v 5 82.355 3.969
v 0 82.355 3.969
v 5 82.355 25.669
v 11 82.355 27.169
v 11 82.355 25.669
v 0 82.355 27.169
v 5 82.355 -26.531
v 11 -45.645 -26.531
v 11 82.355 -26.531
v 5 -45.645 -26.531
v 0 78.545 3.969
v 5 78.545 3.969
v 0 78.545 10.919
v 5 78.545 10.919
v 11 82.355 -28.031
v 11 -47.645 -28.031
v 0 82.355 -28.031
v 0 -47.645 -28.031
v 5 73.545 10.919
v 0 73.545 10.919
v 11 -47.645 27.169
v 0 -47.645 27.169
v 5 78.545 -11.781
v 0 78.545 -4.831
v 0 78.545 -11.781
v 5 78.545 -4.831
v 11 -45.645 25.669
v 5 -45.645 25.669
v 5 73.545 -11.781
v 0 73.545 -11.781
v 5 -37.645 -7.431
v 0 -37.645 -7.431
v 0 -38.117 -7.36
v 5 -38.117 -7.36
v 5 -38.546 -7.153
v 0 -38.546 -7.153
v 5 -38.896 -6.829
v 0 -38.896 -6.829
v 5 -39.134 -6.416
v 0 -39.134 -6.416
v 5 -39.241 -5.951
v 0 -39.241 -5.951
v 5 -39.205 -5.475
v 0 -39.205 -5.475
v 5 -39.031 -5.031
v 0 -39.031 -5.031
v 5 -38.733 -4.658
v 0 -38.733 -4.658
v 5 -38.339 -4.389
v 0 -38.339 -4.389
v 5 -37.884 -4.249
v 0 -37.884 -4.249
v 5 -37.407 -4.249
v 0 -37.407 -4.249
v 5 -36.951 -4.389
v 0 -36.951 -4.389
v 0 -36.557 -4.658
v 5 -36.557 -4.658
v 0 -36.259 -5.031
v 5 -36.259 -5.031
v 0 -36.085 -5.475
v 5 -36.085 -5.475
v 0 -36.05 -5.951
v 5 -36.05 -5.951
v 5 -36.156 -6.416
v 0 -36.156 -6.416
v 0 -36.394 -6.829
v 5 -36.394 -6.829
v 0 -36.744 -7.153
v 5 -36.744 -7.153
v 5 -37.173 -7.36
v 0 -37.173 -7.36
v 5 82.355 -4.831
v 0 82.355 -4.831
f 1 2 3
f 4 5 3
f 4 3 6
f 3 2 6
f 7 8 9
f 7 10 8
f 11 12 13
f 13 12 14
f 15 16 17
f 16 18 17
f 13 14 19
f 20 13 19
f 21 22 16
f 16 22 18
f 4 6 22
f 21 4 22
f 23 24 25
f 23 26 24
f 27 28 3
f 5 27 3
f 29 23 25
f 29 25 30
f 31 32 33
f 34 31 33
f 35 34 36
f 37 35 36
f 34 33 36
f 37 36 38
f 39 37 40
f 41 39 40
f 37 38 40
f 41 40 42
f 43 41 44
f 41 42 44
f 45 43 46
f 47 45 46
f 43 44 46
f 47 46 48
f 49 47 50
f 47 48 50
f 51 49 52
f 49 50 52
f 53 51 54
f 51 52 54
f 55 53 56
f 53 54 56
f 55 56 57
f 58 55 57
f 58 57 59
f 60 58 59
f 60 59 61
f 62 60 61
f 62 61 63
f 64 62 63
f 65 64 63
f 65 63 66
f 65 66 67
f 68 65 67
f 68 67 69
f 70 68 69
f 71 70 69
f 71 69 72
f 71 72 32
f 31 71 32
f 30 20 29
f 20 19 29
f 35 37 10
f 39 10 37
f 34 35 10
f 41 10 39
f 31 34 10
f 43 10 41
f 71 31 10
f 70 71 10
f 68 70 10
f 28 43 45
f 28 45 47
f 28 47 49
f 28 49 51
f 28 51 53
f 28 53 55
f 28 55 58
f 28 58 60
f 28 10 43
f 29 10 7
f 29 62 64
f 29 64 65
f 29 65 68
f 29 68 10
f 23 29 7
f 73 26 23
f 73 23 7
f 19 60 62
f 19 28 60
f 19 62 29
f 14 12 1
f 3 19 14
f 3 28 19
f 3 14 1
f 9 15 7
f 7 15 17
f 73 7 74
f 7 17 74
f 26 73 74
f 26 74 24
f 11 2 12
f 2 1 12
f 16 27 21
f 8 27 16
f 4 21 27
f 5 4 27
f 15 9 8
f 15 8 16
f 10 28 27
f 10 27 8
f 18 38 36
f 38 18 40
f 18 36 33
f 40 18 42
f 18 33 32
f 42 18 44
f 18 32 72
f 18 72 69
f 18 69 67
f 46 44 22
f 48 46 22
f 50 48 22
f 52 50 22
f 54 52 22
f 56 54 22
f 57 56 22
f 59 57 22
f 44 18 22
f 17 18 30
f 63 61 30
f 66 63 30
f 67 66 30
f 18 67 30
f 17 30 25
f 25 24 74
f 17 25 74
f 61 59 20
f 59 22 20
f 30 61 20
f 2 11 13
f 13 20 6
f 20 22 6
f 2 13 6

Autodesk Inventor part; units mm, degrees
ref_plane "YZ Plane" through (0, 0, 0) normal (1, 0, 0) x (0, 1, 0)
ref_plane "XZ Plane" through (0, 0, 0) normal (0, 1, 0) x (-1, 0, 0)
ref_plane "XY Plane" through (0, 0, 0) normal (0, 0, 1) x (1, 0, 0)
sketch "Sketch1" plane through (0, 0, 0) normal (1, 0, 0) x (0, 1, 0)
  line L0 (82.3549, 27.169) -> (-47.6451, 27.169)
  line L1 (-47.6451, 27.169) -> (-47.6451, -28.031)
  line L2 (-47.6451, -28.031) -> (82.3549, -28.031)
  line L3 (82.3549, -28.031) -> (82.3549, 27.169)
  point P0 (0, 0)
  dimension "d0" = 130
  dimension "d1" = 55.2
extrude "Extrusion1" add sketch "Sketch1" along normal blind 5
sketch "Sketch3" plane through (5, 0, 0) normal (1, 0, 0) x (0, 0, -1)
  line L0 (-27.169, -47.6451) -> (28.031, -47.6451) projected
  line L1 (28.031, -47.6451) -> (5.831, -47.6451)
  line L2 (5.831, -47.6451) -> (5.831, -37.6451)
  point P0 (0, 0)
  dimension "d12" = 22.2
  dimension "d13" = 10
hole "Hole2" at (5, -37.6451, -5.831) direction (-1, 0, 0) diameter 3.2 end through all
sketch "Sketch13" plane through (5, 0, 0) normal (1, 0, 0) x (0, 0, -1)
  line L0 (-27.169, -47.6451) -> (28.031, -47.6451) projected
  line L1 (28.031, 82.3549) -> (-27.169, 82.3549) projected
  line L2 (28.031, -47.6451) -> (26.531, -47.6451)
  line L3 (26.531, -47.6451) -> (26.531, 82.3549)
  line L4 (26.531, 82.3549) -> (28.031, 82.3549)
  line L5 (28.031, 82.3549) -> (28.031, -47.6451)
  line L6 (-27.169, 82.3549) -> (-27.169, -47.6451) projected
  line L7 (28.031, 82.3549) -> (-27.169, 82.3549) projected
  line L8 (-27.169, -47.6451) -> (-25.669, -47.6451)
  line L9 (-25.669, -47.6451) -> (-25.669, 82.3549)
  line L10 (-25.669, 82.3549) -> (-27.169, 82.3549)
  line L11 (-27.169, 82.3549) -> (-27.169, -47.6451)
  line L12 (28.031, -47.6451) -> (-27.169, -47.6451)
  line L13 (-27.169, -47.6451) -> (-27.169, -45.6451)
  line L14 (-27.169, -45.6451) -> (28.031, -45.6451)
  line L15 (28.031, -45.6451) -> (28.031, -47.6451)
  point P0 (0, 0)
  point P1 (10.031, 62.3549)
  point P2 (-5.969, 62.3549)
  point P3 (26.531, -45.6451)
  point P4 (-25.669, -45.6451)
  point P5 (18.031, 62.3549)
  dimension "d42" = 1.5
  dimension "d43" = 1.5
  dimension "d44" = 2
extrude "Extrusion7" add sketch "Sketch13" along normal blind 6 contours L6 L14 L9 L0 | L9 L14 L3 L0 | L6 L1 L9 L14 | L3 L14 L5 L0 | L3 L1 L5 L14
sketch "Sketch18" plane through (5, 0, 0) normal (1, 0, 0) x (0, 0, -1)
  line L0 (-3.669, 82.3549) -> (4.531, 82.3549)
  line L1 (26.531, 82.3549) -> (-25.669, 82.3549) projected
  line L2 (4.531, 82.3549) -> (4.8312, 82.3549)
  line L3 (-3.669, 82.3549) -> (-3.969, 82.3549)
  line L4 (-3.969, 82.3549) -> (-3.969, 78.5449)
  line L5 (4.8312, 82.3549) -> (4.8312, 78.5449)
  line L6 (4.8312, 78.5449) -> (11.7812, 78.5449)
  line L7 (-3.969, 78.5449) -> (-10.919, 78.5449)
  line L8 (-10.919, 78.5449) -> (-10.919, 73.5449)
  line L9 (11.7812, 78.5449) -> (11.7812, 73.5449)
  line L10 (-10.919, 73.5449) -> (0, 73.5449)
  line L11 (0, 73.5449) -> (11.7812, 73.5449)
  point P0 (0, 0)
  point P1 (11.531, 82.3549)
  dimension "d78" = 0.3
  dimension "d79" = 3.81
  dimension "d81" = 3.81
  dimension "d83" = 6.95
  dimension "d85" = 6.95
  dimension "d86" = 5
  dimension "d87" = 5
extrude "Extrusion10" cut sketch "Sketch18" against normal blind 7.9375
properties part number "pumpholderinverseproto1"
